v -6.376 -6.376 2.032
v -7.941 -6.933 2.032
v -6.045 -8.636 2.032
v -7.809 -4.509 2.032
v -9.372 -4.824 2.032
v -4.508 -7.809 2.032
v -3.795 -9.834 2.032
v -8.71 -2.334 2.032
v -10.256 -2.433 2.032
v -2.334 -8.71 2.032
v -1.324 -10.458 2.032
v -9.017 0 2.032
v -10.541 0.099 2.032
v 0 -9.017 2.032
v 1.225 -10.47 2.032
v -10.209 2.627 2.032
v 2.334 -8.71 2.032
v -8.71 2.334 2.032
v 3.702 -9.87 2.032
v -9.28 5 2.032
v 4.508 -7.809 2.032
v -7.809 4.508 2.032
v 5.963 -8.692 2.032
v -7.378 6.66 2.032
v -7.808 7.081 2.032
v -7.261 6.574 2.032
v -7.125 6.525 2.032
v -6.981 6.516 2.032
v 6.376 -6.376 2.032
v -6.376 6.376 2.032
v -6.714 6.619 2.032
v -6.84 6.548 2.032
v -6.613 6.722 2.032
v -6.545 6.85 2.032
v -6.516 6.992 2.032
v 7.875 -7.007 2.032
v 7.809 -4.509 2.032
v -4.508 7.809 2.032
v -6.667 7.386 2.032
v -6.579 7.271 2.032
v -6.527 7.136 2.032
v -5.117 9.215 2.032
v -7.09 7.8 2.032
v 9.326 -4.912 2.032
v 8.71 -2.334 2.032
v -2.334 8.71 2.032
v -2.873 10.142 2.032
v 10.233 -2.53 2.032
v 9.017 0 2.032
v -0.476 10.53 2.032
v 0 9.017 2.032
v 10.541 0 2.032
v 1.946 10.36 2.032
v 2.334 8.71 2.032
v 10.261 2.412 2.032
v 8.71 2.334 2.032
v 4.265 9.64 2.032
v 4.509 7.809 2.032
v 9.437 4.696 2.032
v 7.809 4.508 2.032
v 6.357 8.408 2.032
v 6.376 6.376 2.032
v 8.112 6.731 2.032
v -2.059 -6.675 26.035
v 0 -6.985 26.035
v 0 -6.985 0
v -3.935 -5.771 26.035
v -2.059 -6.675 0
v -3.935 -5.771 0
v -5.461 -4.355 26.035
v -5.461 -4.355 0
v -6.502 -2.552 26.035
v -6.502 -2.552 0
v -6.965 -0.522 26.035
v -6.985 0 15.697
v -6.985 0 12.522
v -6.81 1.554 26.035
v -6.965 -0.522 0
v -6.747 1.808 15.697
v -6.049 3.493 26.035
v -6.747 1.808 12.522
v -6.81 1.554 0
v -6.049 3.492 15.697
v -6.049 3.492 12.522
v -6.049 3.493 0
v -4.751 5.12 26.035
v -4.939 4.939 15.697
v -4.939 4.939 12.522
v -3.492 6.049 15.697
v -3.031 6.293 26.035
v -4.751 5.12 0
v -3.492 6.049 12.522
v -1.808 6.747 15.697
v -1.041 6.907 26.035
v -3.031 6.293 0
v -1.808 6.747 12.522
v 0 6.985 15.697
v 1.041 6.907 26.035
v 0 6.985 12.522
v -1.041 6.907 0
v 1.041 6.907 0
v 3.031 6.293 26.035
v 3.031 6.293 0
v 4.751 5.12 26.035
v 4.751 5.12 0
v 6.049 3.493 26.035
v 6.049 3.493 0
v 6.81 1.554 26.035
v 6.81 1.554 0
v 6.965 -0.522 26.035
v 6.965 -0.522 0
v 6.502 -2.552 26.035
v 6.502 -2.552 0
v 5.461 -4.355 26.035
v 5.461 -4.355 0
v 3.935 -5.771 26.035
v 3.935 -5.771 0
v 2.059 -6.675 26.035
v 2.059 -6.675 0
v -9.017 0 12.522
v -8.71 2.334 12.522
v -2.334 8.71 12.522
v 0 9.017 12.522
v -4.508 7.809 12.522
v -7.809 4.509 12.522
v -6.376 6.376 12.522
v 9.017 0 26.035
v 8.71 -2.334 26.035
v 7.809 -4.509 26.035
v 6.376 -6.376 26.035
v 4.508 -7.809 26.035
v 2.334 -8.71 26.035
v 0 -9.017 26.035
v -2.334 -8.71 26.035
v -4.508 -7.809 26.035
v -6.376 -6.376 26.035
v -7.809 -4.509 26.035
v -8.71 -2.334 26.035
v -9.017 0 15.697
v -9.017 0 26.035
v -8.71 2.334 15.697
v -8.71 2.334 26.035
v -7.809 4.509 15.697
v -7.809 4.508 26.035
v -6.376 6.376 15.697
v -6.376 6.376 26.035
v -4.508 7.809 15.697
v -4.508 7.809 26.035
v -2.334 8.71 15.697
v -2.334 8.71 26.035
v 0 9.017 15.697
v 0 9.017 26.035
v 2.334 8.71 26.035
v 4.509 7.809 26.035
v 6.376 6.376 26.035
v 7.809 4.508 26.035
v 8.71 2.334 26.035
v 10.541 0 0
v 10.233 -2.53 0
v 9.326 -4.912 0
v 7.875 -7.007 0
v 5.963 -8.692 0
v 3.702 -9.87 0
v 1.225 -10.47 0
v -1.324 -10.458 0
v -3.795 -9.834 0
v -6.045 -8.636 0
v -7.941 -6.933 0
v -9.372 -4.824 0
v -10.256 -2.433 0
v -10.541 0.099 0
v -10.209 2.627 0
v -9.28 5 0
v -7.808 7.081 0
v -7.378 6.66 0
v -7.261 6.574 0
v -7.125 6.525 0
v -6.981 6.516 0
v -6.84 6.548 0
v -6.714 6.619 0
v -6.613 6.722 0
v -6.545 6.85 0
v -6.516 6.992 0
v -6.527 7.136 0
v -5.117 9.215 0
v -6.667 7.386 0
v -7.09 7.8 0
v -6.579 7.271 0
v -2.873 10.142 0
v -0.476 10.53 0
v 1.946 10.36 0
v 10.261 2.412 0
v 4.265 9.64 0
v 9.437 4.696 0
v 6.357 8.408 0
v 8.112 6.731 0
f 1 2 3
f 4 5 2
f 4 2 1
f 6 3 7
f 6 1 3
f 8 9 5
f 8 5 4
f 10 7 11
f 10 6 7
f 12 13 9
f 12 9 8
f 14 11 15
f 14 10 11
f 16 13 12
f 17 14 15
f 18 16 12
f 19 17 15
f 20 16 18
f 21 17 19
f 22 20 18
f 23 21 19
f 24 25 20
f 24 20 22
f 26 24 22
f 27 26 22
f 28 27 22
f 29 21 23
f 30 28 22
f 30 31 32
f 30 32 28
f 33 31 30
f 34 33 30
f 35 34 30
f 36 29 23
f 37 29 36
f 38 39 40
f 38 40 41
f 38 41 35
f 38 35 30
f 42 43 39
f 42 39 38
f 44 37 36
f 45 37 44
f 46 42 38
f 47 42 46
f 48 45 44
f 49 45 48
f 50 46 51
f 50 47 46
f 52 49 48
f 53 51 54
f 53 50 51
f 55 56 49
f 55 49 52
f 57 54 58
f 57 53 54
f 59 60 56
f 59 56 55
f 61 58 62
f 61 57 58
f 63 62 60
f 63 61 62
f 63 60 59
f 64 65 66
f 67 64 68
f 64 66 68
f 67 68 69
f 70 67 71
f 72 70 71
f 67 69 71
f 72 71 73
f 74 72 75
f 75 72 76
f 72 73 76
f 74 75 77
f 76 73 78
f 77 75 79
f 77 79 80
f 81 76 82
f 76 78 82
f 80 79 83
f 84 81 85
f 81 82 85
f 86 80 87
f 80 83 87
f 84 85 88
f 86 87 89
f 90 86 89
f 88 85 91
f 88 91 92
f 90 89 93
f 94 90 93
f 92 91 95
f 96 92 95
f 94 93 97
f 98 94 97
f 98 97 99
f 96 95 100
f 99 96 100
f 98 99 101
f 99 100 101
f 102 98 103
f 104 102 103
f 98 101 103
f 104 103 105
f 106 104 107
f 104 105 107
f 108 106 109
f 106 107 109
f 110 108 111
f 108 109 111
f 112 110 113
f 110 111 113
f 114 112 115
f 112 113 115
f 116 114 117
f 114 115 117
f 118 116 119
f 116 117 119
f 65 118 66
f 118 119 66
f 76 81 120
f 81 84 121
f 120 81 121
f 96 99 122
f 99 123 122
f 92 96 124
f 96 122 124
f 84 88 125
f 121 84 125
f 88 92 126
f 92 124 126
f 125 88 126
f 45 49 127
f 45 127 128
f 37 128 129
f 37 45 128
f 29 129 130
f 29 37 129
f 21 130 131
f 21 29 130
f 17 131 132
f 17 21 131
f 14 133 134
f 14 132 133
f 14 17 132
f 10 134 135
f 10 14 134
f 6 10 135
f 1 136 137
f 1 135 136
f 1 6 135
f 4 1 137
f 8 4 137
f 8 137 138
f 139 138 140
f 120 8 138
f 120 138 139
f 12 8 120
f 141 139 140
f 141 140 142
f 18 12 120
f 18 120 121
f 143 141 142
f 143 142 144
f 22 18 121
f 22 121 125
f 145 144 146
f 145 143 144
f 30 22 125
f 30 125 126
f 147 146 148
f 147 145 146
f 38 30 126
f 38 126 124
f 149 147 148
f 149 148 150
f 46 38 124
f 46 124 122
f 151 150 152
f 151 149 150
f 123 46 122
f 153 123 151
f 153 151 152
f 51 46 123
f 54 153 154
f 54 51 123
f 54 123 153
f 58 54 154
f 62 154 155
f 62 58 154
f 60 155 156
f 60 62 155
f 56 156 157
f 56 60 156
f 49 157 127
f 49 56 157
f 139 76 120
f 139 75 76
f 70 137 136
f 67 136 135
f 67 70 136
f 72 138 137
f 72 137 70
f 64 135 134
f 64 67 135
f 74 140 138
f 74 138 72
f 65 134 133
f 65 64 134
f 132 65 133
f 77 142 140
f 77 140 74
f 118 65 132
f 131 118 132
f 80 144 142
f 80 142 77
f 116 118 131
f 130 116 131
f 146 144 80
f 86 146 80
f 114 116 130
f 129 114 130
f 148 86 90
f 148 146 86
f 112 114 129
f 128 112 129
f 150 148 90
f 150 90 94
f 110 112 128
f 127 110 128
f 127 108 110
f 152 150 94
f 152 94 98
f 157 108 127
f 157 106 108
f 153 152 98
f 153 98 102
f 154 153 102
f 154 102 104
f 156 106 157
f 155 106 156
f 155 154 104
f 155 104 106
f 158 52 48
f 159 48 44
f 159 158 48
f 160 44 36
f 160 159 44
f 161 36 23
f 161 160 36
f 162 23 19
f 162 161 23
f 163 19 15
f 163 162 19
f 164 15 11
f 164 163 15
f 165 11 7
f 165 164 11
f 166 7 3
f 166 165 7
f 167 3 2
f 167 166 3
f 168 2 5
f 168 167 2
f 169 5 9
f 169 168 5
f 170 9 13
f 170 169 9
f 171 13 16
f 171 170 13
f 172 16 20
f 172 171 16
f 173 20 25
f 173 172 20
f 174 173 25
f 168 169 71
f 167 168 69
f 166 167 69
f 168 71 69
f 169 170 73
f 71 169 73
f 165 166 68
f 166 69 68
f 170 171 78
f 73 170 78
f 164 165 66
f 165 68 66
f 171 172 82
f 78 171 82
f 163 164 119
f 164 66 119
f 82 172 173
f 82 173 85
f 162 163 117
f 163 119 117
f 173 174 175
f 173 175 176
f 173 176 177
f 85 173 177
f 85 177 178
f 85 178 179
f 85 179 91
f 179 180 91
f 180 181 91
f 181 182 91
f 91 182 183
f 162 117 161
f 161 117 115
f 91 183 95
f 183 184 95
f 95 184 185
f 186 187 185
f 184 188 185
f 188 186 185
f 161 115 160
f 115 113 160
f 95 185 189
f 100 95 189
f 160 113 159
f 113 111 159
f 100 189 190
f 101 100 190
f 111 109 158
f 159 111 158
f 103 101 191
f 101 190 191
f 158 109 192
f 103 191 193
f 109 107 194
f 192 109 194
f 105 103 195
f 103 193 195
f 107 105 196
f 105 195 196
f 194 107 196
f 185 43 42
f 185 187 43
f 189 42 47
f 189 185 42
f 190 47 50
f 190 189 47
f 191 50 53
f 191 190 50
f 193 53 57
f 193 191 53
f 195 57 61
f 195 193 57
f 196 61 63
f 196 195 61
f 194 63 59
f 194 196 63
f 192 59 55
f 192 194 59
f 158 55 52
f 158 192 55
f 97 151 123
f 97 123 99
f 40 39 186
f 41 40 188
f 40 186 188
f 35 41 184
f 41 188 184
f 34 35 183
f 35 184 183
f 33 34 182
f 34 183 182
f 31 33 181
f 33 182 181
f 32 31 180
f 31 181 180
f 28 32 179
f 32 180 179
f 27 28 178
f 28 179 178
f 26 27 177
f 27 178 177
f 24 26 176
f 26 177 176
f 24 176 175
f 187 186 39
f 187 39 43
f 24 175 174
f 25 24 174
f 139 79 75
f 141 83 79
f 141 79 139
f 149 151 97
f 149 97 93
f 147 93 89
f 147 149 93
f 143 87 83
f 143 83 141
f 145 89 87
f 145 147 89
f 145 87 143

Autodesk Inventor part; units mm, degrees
ref_plane "YZ Plane" through (0, 0, 0) normal (1, 0, 0) x (0, 1, 0)
ref_plane "XZ Plane" through (0, 0, 0) normal (0, 1, 0) x (-1, 0, 0)
sketch "Sketch1" plane through (0, 0, 0) normal (0, 0, 1) x (1, 0, 0)
  circle A0 centre (0, 0) radius 10.541
  dimension "d0" = 21.082
extrude "Extrusion1" add sketch "Sketch1" along normal blind 2.032
ref_plane "Work Plane4" through (0, 0, 15.6972) normal (0, 0, -1) x (-1, 0, 0)
sketch "Sketch2" plane through (0, 0, 2.032) normal (0, 0, 1) x (1, 0, 0)
  circle A0 centre (0, 0) radius 9.017
  dimension "d3" = 18.034
extrude "Extrusion2" add sketch "Sketch2" along normal blind 24.003
sketch "Sketch5" plane through (0, 0, 15.6972) normal (0, 0, -1) x (-1, 0, 0)
  line L0 (0, 0) -> (9.017, 0)
  line L1 (9.017, 0) -> (9.017, 9.017)
  line L2 (9.017, 9.017) -> (0, 9.017)
  line L3 (0, 9.017) -> (0, 0)
  dimension "d16" = 9.017
  dimension "d17" = 9.017
extrude "Extrusion3" cut sketch "Sketch5" along normal blind 3.175
hole "Hole1" at (0, 0, 26.035) direction (0, 0, -1) diameter 13.97 end through all
sketch "Sketch6" plane through (0, 0, 0) normal (0, 0, -1) x (-1, 0, 0)
  line L0 (0, 0) -> (7.629, -6.3585) construction
  line L1 (0, 0) -> (9.9314, 0) construction
  circle A0 centre (7.629, -6.3585) radius 0.508
  line L2 (7.3038, -6.7487) -> (7.7626, -7.1312)
  circle A1 centre (0, 0) radius 10.541 projected
  line L3 (7.9543, -5.9683) -> (8.4131, -6.3507)
  line L4 (0, 0) -> (7.0226, 7.0226)
  line L5 (0, 0) -> (9.9314, 0) construction
  circle A2 centre (7.0226, 7.0226) radius 0.508
  line L6 (6.6671, 7.3855) -> (7.0903, 7.8)
  line L7 (7.378, 6.6597) -> (7.8083, 7.0811)
  line L8 (10.541, 0) -> (10.541, 7.62)
  dimension "d20" = 9.9314
  dimension "d21" = 39.81
  dimension "d22" = 1.016
  dimension "d25" = 9.9314
  dimension "d26" = 45
  dimension "d27" = 1.016
  dimension "d30" = 7.62
extrude "Extrusion5" cut sketch "Sketch6" against normal through all contours A1 L7 A2 L6 | A2
sketch "Sketch7" plane through (0, 0, 26.035) normal (0, 0, 1) x (1, 0, 0)
  point P0 (0, 0)
properties part number "Piston Shaft"
